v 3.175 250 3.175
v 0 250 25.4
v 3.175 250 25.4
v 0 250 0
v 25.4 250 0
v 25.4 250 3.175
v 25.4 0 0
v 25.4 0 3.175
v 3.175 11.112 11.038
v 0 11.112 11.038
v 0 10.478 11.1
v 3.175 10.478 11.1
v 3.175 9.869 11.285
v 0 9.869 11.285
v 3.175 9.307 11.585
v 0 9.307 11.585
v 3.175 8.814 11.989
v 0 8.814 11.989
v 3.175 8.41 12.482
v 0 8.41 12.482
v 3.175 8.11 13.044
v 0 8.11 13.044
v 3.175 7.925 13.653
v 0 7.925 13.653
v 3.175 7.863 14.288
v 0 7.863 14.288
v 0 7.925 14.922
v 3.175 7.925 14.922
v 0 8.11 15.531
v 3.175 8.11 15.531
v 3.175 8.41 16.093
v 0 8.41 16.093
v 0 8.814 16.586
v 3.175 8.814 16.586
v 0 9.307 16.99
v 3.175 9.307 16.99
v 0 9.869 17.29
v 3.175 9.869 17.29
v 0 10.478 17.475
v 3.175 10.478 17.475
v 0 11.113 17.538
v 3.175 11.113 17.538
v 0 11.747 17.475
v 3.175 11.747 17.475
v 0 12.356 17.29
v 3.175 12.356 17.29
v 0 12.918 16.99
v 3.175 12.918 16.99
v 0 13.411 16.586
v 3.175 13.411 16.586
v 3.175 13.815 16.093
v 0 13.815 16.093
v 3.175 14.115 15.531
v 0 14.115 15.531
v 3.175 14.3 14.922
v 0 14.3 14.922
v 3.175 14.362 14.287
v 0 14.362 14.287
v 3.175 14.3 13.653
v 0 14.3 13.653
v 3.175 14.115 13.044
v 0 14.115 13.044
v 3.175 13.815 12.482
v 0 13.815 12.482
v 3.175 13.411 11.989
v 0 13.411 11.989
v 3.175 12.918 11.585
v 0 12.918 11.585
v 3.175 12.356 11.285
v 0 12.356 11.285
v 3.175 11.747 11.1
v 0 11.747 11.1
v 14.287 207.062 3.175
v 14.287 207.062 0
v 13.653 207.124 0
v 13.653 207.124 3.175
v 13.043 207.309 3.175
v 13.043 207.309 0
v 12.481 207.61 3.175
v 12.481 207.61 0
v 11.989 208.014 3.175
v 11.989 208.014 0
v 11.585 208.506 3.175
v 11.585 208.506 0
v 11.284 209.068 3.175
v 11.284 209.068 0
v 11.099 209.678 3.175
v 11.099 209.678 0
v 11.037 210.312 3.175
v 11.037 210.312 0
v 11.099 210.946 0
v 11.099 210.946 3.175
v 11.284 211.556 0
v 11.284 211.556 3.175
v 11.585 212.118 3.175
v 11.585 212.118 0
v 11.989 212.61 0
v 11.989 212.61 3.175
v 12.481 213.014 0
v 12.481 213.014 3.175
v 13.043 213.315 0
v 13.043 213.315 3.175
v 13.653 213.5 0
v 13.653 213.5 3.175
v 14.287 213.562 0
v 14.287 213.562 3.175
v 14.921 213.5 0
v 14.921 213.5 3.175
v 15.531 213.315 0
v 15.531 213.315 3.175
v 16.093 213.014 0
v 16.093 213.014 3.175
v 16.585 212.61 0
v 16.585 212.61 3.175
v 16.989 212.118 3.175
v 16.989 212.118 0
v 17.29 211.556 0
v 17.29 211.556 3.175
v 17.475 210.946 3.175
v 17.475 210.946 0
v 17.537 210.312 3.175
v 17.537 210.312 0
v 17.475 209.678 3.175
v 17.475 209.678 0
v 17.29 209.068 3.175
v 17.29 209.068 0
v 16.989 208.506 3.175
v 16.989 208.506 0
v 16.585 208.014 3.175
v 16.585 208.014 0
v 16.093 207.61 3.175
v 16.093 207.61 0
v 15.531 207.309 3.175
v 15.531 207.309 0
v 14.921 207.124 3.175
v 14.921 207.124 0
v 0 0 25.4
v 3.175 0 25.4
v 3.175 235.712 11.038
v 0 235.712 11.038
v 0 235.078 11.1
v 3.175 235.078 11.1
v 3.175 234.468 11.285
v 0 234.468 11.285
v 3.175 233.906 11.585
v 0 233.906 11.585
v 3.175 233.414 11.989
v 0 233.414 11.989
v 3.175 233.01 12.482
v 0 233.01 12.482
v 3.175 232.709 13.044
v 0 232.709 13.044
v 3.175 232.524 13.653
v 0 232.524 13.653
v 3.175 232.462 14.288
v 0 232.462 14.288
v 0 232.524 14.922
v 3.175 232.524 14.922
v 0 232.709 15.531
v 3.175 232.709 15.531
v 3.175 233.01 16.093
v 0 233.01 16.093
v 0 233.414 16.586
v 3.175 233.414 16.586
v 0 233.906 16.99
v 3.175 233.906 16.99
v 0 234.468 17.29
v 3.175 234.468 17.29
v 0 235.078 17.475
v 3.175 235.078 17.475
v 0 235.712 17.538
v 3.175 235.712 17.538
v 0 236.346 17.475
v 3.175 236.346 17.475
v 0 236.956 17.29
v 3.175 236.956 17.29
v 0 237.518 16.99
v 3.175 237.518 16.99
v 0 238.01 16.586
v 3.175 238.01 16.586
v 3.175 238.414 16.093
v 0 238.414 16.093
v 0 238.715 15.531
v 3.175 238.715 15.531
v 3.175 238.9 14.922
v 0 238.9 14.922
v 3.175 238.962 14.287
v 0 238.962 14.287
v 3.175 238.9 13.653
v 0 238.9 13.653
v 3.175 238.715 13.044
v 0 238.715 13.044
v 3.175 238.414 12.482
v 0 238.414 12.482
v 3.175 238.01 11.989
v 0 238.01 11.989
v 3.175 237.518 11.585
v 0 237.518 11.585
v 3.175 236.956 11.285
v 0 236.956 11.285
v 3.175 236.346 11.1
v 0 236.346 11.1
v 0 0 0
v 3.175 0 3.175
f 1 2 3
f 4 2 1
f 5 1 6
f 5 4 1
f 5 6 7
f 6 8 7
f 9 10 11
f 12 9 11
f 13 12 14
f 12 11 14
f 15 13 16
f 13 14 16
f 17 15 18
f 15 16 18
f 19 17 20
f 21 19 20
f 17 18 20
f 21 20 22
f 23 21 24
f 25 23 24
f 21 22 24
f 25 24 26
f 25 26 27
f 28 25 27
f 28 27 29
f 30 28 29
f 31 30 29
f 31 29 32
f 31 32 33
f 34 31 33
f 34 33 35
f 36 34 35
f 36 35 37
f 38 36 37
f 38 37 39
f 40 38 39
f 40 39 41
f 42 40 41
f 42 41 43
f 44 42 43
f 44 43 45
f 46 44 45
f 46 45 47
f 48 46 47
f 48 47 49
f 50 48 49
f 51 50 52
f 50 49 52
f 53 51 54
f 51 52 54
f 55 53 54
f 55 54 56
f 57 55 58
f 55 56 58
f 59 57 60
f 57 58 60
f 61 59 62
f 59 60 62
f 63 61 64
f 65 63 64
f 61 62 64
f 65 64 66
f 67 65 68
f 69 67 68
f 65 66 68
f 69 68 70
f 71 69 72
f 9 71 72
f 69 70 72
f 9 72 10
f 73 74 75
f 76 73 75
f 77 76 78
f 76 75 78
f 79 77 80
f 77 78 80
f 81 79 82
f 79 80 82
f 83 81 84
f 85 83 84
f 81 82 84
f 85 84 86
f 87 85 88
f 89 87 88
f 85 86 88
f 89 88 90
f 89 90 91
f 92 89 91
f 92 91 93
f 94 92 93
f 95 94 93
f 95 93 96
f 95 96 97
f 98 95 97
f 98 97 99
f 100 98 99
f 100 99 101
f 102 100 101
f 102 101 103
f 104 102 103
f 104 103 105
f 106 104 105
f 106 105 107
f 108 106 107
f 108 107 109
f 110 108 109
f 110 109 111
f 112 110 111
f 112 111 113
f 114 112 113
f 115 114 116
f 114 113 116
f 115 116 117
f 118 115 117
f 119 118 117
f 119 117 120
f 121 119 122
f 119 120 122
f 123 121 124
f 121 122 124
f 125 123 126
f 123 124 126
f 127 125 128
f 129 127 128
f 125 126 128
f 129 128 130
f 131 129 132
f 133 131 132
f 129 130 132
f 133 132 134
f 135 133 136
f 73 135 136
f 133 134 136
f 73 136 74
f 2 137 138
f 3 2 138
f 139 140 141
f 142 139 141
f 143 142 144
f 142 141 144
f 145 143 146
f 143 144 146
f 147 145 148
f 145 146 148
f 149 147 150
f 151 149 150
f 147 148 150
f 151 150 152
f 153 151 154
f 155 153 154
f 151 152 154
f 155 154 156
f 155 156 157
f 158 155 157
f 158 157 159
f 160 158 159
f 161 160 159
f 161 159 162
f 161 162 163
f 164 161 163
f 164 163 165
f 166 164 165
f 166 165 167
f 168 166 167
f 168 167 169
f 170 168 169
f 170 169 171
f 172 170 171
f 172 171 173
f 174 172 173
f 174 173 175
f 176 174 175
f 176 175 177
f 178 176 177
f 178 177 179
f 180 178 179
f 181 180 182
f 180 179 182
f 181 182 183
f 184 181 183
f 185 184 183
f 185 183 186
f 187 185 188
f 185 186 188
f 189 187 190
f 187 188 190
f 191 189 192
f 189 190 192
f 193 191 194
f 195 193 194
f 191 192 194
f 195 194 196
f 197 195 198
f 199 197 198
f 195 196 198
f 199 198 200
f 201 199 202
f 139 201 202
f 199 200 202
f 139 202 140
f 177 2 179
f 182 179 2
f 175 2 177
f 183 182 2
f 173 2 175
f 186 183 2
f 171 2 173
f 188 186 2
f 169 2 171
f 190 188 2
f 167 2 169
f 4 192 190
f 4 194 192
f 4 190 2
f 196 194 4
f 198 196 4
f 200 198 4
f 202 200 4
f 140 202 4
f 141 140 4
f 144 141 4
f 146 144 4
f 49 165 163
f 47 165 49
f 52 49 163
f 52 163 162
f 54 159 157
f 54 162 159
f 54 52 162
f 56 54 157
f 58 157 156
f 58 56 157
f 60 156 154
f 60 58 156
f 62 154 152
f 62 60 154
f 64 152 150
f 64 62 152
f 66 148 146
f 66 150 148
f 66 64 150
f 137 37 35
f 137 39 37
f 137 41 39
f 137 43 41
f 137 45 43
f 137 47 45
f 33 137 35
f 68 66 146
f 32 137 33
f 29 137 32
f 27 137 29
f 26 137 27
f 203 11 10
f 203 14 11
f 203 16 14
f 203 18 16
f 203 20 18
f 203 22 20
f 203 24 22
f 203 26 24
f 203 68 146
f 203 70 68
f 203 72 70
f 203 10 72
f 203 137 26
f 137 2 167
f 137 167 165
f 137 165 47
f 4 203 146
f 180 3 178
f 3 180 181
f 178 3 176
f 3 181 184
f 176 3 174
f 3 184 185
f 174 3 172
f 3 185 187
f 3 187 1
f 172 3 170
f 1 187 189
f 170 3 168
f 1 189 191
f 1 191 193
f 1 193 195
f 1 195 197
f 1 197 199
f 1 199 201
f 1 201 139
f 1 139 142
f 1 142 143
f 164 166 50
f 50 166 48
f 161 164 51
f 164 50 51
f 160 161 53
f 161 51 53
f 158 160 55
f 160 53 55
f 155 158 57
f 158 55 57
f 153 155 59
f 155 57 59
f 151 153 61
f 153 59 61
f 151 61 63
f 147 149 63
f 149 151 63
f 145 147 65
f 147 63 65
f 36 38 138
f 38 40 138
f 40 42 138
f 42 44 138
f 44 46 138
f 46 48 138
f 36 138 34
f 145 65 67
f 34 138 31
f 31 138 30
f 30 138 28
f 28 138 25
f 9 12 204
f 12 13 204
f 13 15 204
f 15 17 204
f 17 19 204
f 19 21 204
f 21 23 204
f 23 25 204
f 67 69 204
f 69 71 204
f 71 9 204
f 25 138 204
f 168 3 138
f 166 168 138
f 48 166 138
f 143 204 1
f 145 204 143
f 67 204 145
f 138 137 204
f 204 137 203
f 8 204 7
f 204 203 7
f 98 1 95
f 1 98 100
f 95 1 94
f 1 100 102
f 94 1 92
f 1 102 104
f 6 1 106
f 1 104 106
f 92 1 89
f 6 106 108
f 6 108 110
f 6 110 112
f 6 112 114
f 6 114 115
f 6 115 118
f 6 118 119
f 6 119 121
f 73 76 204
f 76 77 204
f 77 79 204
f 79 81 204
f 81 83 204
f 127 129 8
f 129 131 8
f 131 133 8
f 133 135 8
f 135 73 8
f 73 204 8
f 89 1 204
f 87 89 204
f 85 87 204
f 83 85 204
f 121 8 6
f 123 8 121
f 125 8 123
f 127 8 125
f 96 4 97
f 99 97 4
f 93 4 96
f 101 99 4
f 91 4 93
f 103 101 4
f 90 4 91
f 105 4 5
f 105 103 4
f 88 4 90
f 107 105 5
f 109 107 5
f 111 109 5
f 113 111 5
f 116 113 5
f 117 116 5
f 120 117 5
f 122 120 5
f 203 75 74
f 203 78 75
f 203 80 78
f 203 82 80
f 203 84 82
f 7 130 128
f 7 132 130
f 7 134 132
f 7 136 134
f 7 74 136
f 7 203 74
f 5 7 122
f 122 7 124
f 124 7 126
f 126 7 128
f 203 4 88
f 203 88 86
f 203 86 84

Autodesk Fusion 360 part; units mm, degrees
sketch "Sketch1" plane through (0, 0, 0) normal (0, 1, 0) x (1, 0, 0)
  line L0 (0, -25.4) -> (0, 0)
  line L1 (0, 0) -> (25.4, 0)
  line L2 (12.7, -12.7) -> (11.05, -11.05) construction
  line L3 (3.175, -25.4) -> (3.175, -3.175)
  line L4 (3.175, -3.175) -> (25.4, -3.175)
  line L5 (25.4, -3.175) -> (25.4, 0)
  line L6 (0, -25.4) -> (3.175, -25.4)
  dimension "d1" = 25.4
  dimension "d2" = 25.4
  dimension "d13" = 3.175
extrude "Extrude1" add sketch "Sketch1" along normal blind 250
sketch "Sketch2" plane through (3.175, 0, 0) normal (1, 0, 0) x (0, 0, -1)
  line L0 (-25.4, 0) -> (-3.175, 0)
  line L1 (-3.175, 0) -> (-3.175, 250)
  line L2 (-3.175, 250) -> (-25.4, 250)
  line L3 (-25.4, 250) -> (-25.4, 0)
  circle A0 centre (-14.2875, 235.712) radius 2.76
  circle A1 centre (-14.2875, 11.1125) radius 2.5546
  line L4 (-14.2875, 250) -> (-14.2875, 0) construction
  dimension "d14" = 14.288
  dimension "d15" = 11.1125
hole "Hole1" at (3.175, 11.1125, 14.2875) at (3.175, 235.712, 14.2875) direction (-1, 0, 0) diameter 6.5 end through all
hole "Hole2" at (14.287, 210.312, 3.175) direction (0, 0, -1) diameter 6.5 end through all
equation "d15 = ( 22.225 / 2 ) * 1 mm"
